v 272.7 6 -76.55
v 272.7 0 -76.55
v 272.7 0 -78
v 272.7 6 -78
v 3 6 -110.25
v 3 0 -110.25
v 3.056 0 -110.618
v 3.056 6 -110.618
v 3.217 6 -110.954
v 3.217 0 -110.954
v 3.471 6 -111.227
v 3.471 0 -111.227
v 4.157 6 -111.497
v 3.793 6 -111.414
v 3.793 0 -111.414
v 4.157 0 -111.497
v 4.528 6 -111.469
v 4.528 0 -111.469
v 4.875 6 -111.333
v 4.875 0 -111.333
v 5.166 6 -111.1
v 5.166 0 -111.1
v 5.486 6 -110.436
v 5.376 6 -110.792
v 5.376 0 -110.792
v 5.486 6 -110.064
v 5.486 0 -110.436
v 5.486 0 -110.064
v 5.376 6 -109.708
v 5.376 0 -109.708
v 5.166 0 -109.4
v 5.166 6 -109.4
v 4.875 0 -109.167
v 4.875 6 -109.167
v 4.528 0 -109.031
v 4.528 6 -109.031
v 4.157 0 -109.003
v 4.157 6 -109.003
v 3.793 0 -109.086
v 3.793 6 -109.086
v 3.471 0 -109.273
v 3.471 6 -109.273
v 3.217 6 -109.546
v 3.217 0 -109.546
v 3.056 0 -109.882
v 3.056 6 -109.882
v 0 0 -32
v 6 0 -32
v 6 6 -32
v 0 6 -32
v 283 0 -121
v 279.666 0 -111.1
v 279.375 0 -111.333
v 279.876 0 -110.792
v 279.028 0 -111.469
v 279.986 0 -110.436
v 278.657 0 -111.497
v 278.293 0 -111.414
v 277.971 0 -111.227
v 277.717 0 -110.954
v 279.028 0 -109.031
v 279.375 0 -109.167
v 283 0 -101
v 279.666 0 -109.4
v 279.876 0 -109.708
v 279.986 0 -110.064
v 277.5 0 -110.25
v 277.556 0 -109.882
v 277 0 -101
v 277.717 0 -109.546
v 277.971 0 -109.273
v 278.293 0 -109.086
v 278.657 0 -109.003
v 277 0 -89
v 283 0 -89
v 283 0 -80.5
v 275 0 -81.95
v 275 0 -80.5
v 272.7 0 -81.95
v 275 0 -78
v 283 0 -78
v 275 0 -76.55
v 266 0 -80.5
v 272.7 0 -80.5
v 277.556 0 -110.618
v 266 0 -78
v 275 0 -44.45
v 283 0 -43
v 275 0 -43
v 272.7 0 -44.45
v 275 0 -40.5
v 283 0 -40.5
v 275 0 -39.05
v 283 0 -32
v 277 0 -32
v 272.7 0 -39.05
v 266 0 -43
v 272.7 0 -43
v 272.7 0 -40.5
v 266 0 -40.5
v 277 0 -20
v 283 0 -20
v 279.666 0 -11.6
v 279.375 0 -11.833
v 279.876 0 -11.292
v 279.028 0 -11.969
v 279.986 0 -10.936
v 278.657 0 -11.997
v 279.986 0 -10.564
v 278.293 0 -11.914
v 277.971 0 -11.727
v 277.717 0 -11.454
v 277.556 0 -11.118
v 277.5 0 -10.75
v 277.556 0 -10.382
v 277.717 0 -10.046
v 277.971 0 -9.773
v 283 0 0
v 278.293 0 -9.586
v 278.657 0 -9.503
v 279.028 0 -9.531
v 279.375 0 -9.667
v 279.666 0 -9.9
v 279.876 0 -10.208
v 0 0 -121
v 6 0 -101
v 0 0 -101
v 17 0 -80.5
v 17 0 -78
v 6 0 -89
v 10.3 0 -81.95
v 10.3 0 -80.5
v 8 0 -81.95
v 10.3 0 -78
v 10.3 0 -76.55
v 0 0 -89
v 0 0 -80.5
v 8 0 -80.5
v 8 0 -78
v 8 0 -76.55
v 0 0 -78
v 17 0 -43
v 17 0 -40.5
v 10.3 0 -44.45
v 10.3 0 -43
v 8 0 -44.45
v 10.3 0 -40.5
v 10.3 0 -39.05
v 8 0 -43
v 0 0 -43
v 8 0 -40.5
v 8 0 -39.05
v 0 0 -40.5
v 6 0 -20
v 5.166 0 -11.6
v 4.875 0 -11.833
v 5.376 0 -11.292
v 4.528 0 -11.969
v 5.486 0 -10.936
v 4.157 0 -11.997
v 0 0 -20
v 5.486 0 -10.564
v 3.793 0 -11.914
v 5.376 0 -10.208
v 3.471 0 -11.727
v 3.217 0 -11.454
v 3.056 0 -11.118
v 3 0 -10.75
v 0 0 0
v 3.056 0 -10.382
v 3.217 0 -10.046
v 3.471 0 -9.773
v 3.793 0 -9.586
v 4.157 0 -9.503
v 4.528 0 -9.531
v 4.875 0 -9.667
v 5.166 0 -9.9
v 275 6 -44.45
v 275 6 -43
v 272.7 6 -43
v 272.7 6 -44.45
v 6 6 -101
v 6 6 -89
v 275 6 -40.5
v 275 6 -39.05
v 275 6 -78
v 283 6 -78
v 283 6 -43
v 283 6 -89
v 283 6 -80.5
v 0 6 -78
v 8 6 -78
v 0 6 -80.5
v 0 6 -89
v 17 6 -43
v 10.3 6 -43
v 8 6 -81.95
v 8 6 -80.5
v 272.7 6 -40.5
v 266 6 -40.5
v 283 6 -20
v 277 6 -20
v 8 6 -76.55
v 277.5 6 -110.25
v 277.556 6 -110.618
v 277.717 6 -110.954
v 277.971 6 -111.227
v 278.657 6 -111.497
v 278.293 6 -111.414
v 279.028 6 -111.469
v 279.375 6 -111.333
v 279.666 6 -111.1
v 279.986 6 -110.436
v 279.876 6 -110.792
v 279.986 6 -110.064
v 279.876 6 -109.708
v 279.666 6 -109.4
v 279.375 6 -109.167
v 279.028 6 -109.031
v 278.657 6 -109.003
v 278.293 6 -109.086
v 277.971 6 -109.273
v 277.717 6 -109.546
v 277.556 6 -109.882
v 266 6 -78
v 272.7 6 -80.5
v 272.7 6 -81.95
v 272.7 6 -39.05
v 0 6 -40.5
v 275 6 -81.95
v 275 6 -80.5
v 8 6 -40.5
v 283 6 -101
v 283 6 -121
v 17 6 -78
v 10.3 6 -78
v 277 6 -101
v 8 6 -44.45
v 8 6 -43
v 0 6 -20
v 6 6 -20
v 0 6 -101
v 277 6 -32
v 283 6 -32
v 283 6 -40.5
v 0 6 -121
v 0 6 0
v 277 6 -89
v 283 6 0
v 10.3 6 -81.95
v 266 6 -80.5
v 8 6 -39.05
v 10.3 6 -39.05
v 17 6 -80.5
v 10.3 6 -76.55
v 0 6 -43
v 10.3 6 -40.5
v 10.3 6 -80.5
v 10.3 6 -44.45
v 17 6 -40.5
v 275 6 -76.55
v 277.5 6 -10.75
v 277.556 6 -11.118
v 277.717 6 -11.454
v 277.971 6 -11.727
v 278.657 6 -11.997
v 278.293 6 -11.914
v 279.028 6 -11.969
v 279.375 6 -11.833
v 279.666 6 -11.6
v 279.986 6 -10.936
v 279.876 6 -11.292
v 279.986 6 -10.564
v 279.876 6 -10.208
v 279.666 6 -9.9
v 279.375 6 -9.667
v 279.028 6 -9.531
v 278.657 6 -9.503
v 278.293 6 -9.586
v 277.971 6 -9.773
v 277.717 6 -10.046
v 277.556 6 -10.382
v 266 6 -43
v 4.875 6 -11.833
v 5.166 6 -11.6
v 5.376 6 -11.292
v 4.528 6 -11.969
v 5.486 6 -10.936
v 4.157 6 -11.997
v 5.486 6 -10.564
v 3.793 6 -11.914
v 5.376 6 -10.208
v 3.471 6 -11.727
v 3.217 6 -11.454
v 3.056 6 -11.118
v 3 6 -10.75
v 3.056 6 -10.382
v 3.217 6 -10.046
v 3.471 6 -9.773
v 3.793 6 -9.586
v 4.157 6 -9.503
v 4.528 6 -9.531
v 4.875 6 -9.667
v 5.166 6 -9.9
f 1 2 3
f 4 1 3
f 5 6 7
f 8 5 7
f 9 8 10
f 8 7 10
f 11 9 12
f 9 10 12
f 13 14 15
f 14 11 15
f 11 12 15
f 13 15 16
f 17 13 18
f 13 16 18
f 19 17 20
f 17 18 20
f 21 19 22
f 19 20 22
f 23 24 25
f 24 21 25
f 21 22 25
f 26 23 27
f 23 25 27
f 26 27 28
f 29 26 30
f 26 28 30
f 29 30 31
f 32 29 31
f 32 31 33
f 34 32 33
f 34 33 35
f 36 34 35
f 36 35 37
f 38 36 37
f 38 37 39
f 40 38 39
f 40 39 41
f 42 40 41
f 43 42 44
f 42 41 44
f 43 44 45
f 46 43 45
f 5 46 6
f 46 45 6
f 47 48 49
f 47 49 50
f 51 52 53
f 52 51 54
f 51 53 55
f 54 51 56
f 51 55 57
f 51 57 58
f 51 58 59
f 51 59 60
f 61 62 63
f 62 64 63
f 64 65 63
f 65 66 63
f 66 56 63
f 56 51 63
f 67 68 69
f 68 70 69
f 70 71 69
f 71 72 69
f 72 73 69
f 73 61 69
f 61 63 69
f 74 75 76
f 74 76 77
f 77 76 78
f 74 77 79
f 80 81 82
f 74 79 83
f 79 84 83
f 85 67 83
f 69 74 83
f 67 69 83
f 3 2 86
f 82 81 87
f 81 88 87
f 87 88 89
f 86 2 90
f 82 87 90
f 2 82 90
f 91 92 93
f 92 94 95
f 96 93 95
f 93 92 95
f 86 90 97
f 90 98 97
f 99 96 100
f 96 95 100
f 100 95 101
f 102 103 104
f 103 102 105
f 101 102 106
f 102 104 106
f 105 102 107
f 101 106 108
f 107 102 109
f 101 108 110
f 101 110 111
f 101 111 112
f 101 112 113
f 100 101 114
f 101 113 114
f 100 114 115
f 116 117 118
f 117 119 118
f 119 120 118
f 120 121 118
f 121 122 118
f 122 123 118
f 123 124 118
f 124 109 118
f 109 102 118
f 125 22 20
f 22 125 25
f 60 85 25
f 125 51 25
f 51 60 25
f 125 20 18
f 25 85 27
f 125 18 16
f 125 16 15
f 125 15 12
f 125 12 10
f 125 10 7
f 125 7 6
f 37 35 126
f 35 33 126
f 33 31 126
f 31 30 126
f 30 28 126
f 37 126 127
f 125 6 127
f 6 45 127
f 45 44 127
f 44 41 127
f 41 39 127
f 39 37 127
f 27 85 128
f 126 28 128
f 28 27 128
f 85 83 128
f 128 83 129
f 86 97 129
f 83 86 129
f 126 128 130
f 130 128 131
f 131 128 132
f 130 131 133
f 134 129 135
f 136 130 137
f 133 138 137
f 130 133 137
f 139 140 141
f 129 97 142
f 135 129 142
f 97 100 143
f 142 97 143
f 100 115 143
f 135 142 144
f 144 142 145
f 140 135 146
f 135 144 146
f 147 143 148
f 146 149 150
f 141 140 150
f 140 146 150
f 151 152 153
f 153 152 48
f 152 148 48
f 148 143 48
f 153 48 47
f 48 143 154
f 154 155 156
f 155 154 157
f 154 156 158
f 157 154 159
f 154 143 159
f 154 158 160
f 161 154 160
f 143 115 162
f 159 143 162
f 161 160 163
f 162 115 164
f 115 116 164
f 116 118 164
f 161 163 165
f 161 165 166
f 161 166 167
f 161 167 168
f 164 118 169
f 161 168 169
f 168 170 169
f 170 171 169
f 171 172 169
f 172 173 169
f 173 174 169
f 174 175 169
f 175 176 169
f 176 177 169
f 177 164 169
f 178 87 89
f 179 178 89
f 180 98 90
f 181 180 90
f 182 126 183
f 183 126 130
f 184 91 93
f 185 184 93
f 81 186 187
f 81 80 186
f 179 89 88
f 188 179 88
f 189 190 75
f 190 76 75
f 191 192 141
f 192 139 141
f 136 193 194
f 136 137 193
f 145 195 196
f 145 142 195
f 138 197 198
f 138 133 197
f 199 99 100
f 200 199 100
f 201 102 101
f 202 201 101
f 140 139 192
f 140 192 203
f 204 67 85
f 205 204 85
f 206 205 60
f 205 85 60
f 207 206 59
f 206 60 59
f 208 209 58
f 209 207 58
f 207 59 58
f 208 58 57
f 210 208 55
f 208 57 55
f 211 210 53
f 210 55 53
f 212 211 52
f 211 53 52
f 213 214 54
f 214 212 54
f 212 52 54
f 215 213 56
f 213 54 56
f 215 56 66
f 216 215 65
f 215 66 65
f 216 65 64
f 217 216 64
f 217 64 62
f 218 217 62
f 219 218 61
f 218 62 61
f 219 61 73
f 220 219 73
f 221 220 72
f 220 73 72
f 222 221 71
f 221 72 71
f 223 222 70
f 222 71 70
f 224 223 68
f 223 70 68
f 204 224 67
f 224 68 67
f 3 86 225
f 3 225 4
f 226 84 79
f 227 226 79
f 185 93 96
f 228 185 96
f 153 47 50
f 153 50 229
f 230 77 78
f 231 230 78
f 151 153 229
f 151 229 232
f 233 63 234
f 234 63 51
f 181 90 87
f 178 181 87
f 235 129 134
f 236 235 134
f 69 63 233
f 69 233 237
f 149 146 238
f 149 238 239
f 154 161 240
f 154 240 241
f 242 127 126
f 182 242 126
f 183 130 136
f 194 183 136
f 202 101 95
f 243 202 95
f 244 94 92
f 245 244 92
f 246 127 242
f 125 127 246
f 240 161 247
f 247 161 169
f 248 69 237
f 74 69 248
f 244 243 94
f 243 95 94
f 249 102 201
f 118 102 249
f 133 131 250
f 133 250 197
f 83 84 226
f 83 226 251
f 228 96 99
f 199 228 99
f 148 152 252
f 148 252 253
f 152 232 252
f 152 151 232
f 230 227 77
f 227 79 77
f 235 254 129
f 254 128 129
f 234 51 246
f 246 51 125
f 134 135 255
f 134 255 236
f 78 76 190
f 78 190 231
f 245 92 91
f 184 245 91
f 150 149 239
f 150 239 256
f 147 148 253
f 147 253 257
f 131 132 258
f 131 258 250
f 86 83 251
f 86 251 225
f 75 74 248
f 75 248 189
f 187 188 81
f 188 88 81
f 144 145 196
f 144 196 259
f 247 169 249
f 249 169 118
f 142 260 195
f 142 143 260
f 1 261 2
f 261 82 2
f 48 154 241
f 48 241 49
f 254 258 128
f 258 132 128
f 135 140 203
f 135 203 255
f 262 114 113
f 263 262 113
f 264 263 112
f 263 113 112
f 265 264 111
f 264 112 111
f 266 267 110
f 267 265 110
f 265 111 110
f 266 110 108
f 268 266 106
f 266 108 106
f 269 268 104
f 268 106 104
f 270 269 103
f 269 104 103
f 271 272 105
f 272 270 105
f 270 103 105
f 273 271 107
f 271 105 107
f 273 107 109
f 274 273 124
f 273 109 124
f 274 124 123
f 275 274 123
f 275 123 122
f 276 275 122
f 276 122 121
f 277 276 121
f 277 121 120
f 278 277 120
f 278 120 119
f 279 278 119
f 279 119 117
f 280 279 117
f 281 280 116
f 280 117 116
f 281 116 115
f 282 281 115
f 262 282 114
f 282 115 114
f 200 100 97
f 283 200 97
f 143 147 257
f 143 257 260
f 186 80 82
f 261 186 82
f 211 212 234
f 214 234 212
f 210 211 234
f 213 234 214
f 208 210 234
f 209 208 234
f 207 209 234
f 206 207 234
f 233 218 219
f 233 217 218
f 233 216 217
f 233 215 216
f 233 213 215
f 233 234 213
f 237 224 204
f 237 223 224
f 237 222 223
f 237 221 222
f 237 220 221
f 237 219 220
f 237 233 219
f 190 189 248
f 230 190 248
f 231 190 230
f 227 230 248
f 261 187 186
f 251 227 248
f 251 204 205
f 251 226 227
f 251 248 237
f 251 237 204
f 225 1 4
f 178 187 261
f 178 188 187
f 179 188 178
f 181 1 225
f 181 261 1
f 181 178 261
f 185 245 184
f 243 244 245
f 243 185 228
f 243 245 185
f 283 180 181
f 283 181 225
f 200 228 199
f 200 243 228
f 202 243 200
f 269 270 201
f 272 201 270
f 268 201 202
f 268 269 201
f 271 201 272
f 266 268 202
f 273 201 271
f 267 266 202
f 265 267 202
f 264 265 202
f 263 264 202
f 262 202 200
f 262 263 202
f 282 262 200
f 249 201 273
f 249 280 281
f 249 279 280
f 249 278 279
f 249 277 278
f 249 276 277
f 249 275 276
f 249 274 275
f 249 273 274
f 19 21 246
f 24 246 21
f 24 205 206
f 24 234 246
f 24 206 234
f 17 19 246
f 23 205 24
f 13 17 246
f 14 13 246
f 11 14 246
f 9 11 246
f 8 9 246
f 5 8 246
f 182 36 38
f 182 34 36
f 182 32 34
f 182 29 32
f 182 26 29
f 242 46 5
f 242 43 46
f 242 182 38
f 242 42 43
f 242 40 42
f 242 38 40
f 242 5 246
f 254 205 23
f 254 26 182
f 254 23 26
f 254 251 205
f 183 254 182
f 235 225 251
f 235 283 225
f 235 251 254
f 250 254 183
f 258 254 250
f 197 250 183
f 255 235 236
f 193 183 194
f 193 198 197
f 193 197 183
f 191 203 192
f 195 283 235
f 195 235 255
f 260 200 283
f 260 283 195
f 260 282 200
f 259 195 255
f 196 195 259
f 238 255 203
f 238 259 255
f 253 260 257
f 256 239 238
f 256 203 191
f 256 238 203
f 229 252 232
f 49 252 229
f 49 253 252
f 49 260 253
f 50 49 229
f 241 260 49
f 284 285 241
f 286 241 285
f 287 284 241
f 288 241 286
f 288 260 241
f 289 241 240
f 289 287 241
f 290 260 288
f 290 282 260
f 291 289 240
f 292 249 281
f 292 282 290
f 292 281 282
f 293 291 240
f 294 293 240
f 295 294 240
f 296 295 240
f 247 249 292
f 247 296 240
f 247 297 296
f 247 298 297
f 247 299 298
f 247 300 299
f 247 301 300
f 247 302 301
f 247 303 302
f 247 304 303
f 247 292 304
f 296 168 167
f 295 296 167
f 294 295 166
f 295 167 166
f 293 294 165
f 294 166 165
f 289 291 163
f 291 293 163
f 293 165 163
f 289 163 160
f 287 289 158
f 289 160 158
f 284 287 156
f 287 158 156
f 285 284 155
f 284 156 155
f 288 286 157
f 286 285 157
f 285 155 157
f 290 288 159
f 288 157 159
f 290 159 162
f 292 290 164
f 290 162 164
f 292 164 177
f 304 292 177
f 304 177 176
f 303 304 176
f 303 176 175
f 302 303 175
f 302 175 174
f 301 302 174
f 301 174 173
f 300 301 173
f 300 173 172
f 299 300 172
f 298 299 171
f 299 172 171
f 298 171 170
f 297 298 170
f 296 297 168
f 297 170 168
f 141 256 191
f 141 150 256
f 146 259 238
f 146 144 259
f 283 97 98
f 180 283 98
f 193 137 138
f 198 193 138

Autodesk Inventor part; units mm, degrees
ref_plane "YZ Plane" through (0, 0, 0) normal (1, 0, 0) x (0, 1, 0)
ref_plane "XZ Plane" through (0, 0, 0) normal (0, 1, 0) x (-1, 0, 0)
ref_plane "XY Plane" through (0, 0, 0) normal (0, 0, 1) x (1, 0, 0)
sketch "Sketch1" plane through (0, 0, 0) normal (0, 1, 0) x (-1, 0, 0)
  line L0 (0, 0) -> (-283, 0)
  line L1 (-283, -121) -> (0, -121)
  line L2 (-283, -101) -> (-277, -101)
  line L3 (-277, -101) -> (-277, -89)
  line L4 (-277, -89) -> (-283, -89)
  line L5 (-283, -89) -> (-283, -101) construction
  line L6 (-283, -20) -> (-277, -20)
  line L7 (-277, -20) -> (-277, -32)
  line L8 (-277, -32) -> (-283, -32)
  line L9 (-283, -32) -> (-283, -20) construction
  line L10 (-141.5, 0) -> (-141.5, -121) construction
  line L11 (-283, -20) -> (-283, 0)
  line L12 (-283, -32) -> (-283, -40.5)
  line L13 (-283, -101) -> (-283, -121)
  circle A0 centre (-278.75, -10.75) radius 1.25
  line L14 (-278.75, -10.75) -> (-278.75, -20) construction
  circle A1 centre (-278.75, -110.25) radius 1.25
  line L15 (-283, -80.5) -> (-275, -80.5)
  line L16 (-266, -80.5) -> (-266, -78)
  line L17 (-266, -78) -> (-272.7, -78)
  line L18 (-283, -40.5) -> (-275, -40.5)
  line L19 (-266, -40.5) -> (-266, -43)
  line L20 (-266, -43) -> (-272.7, -43)
  line L21 (-283, -80.5) -> (-283, -89)
  line L22 (-283, -78) -> (-283, -80.5) construction
  line L23 (-283, -43) -> (-283, -78)
  line L24 (-283, -40.5) -> (-283, -43) construction
  line L25 (-272.7, -44.45) -> (-275, -44.45)
  line L26 (-275, -44.45) -> (-275, -43)
  line L27 (-275, -39.05) -> (-272.7, -39.05)
  line L28 (-272.7, -39.05) -> (-272.7, -40.5)
  line L29 (-275, -43) -> (-275, -40.5) construction
  line L30 (-275, -40.5) -> (-275, -39.05)
  line L31 (-272.7, -43) -> (-272.7, -44.45)
  line L32 (-272.7, -40.5) -> (-272.7, -43) construction
  line L33 (-272.7, -40.5) -> (-266, -40.5)
  line L34 (-275, -40.5) -> (-272.7, -40.5) construction
  line L35 (-272.7, -43) -> (-275, -43) construction
  line L36 (-275, -43) -> (-283, -43)
  line L37 (-272.7, -81.95) -> (-275, -81.95)
  line L38 (-275, -81.95) -> (-275, -80.5)
  line L39 (-275, -76.55) -> (-272.7, -76.55)
  line L40 (-272.7, -76.55) -> (-272.7, -78)
  line L41 (-272.7, -80.5) -> (-272.7, -81.95)
  line L42 (-272.7, -78) -> (-272.7, -80.5) construction
  line L43 (-275, -80.5) -> (-275, -78) construction
  line L44 (-275, -78) -> (-275, -76.55)
  line L45 (-275, -80.5) -> (-272.7, -80.5) construction
  line L46 (-272.7, -80.5) -> (-266, -80.5)
  line L47 (-272.7, -78) -> (-275, -78) construction
  line L48 (-275, -78) -> (-283, -78)
  line L49 (0, -101) -> (-6, -101)
  line L50 (-6, -101) -> (-6, -89)
  line L51 (-6, -89) -> (0, -89)
  line L52 (0, -89) -> (0, -101) construction
  line L53 (0, -20) -> (-6, -20)
  line L54 (-6, -20) -> (-6, -32)
  line L55 (-6, -32) -> (0, -32)
  line L56 (0, -32) -> (0, -20) construction
  line L57 (0, -20) -> (0, 0)
  line L58 (0, -32) -> (0, -40.5)
  line L59 (0, -101) -> (0, -121)
  circle A2 centre (-4.25, -10.75) radius 1.25
  line L60 (-4.25, -10.75) -> (-4.25, -20) construction
  circle A3 centre (-4.25, -110.25) radius 1.25
  line L61 (0, -80.5) -> (-8, -80.5)
  line L62 (-17, -80.5) -> (-17, -78)
  line L63 (-17, -78) -> (-10.3, -78)
  line L64 (0, -40.5) -> (-8, -40.5)
  line L65 (-17, -40.5) -> (-17, -43)
  line L66 (-17, -43) -> (-10.3, -43)
  line L67 (0, -80.5) -> (0, -89)
  line L68 (0, -78) -> (0, -80.5) construction
  line L69 (0, -43) -> (0, -78)
  line L70 (0, -40.5) -> (0, -43) construction
  line L71 (-10.3, -44.45) -> (-8, -44.45)
  line L72 (-8, -44.45) -> (-8, -43)
  line L73 (-8, -39.05) -> (-10.3, -39.05)
  line L74 (-10.3, -39.05) -> (-10.3, -40.5)
  line L75 (-8, -43) -> (-8, -40.5) construction
  line L76 (-8, -40.5) -> (-8, -39.05)
  line L77 (-10.3, -43) -> (-10.3, -44.45)
  line L78 (-10.3, -40.5) -> (-10.3, -43) construction
  line L79 (-10.3, -40.5) -> (-17, -40.5)
  line L80 (-8, -40.5) -> (-10.3, -40.5) construction
  line L81 (-10.3, -43) -> (-8, -43) construction
  line L82 (-8, -43) -> (0, -43)
  line L83 (-10.3, -81.95) -> (-8, -81.95)
  line L84 (-8, -81.95) -> (-8, -80.5)
  line L85 (-8, -76.55) -> (-10.3, -76.55)
  line L86 (-10.3, -76.55) -> (-10.3, -78)
  line L87 (-10.3, -80.5) -> (-10.3, -81.95)
  line L88 (-10.3, -78) -> (-10.3, -80.5) construction
  line L89 (-8, -80.5) -> (-8, -78) construction
  line L90 (-8, -78) -> (-8, -76.55)
  line L91 (-8, -80.5) -> (-10.3, -80.5) construction
  line L92 (-10.3, -80.5) -> (-17, -80.5)
  line L93 (-10.3, -78) -> (-8, -78) construction
  line L94 (-8, -78) -> (0, -78)
  dimension "d0" = 283
  dimension "d1" = 121
  dimension "d20" = 6
  dimension "d21" = 12
  dimension "d22" = 12
  dimension "d26" = 57
  dimension "d27" = 2.5
  dimension "d28" = 4.25
  dimension "d29" = 9.25
  dimension "d30" = 2.5
  dimension "d31" = 4.25
  dimension "d32" = 9.25
  dimension "d33" = 17
  dimension "d34" = 2.5
  dimension "d35" = 17
  dimension "d36" = 2.5
  dimension "d37" = 8.5
  dimension "d39" = 20
  dimension "d40" = 2.3
  dimension "d41" = 5.4
  dimension "d42" = 2.3
  dimension "d43" = 5.4
  dimension "d44" = 8
  dimension "d45" = 8
extrude "Extrusion2" add sketch "Sketch1" along normal blind 6
equation "\"d22\" = d21"
equation "\"d30\" = d27"
equation "\"d31\" = d28"
equation "\"d32\" = d29"
equation "\"d33\" = d35"
equation "\"d34\" = d36"
equation "\"d42\" = d40"
equation "\"d43\" = d41"
equation "\"d44\" = d45"
properties part number "wall-front"
